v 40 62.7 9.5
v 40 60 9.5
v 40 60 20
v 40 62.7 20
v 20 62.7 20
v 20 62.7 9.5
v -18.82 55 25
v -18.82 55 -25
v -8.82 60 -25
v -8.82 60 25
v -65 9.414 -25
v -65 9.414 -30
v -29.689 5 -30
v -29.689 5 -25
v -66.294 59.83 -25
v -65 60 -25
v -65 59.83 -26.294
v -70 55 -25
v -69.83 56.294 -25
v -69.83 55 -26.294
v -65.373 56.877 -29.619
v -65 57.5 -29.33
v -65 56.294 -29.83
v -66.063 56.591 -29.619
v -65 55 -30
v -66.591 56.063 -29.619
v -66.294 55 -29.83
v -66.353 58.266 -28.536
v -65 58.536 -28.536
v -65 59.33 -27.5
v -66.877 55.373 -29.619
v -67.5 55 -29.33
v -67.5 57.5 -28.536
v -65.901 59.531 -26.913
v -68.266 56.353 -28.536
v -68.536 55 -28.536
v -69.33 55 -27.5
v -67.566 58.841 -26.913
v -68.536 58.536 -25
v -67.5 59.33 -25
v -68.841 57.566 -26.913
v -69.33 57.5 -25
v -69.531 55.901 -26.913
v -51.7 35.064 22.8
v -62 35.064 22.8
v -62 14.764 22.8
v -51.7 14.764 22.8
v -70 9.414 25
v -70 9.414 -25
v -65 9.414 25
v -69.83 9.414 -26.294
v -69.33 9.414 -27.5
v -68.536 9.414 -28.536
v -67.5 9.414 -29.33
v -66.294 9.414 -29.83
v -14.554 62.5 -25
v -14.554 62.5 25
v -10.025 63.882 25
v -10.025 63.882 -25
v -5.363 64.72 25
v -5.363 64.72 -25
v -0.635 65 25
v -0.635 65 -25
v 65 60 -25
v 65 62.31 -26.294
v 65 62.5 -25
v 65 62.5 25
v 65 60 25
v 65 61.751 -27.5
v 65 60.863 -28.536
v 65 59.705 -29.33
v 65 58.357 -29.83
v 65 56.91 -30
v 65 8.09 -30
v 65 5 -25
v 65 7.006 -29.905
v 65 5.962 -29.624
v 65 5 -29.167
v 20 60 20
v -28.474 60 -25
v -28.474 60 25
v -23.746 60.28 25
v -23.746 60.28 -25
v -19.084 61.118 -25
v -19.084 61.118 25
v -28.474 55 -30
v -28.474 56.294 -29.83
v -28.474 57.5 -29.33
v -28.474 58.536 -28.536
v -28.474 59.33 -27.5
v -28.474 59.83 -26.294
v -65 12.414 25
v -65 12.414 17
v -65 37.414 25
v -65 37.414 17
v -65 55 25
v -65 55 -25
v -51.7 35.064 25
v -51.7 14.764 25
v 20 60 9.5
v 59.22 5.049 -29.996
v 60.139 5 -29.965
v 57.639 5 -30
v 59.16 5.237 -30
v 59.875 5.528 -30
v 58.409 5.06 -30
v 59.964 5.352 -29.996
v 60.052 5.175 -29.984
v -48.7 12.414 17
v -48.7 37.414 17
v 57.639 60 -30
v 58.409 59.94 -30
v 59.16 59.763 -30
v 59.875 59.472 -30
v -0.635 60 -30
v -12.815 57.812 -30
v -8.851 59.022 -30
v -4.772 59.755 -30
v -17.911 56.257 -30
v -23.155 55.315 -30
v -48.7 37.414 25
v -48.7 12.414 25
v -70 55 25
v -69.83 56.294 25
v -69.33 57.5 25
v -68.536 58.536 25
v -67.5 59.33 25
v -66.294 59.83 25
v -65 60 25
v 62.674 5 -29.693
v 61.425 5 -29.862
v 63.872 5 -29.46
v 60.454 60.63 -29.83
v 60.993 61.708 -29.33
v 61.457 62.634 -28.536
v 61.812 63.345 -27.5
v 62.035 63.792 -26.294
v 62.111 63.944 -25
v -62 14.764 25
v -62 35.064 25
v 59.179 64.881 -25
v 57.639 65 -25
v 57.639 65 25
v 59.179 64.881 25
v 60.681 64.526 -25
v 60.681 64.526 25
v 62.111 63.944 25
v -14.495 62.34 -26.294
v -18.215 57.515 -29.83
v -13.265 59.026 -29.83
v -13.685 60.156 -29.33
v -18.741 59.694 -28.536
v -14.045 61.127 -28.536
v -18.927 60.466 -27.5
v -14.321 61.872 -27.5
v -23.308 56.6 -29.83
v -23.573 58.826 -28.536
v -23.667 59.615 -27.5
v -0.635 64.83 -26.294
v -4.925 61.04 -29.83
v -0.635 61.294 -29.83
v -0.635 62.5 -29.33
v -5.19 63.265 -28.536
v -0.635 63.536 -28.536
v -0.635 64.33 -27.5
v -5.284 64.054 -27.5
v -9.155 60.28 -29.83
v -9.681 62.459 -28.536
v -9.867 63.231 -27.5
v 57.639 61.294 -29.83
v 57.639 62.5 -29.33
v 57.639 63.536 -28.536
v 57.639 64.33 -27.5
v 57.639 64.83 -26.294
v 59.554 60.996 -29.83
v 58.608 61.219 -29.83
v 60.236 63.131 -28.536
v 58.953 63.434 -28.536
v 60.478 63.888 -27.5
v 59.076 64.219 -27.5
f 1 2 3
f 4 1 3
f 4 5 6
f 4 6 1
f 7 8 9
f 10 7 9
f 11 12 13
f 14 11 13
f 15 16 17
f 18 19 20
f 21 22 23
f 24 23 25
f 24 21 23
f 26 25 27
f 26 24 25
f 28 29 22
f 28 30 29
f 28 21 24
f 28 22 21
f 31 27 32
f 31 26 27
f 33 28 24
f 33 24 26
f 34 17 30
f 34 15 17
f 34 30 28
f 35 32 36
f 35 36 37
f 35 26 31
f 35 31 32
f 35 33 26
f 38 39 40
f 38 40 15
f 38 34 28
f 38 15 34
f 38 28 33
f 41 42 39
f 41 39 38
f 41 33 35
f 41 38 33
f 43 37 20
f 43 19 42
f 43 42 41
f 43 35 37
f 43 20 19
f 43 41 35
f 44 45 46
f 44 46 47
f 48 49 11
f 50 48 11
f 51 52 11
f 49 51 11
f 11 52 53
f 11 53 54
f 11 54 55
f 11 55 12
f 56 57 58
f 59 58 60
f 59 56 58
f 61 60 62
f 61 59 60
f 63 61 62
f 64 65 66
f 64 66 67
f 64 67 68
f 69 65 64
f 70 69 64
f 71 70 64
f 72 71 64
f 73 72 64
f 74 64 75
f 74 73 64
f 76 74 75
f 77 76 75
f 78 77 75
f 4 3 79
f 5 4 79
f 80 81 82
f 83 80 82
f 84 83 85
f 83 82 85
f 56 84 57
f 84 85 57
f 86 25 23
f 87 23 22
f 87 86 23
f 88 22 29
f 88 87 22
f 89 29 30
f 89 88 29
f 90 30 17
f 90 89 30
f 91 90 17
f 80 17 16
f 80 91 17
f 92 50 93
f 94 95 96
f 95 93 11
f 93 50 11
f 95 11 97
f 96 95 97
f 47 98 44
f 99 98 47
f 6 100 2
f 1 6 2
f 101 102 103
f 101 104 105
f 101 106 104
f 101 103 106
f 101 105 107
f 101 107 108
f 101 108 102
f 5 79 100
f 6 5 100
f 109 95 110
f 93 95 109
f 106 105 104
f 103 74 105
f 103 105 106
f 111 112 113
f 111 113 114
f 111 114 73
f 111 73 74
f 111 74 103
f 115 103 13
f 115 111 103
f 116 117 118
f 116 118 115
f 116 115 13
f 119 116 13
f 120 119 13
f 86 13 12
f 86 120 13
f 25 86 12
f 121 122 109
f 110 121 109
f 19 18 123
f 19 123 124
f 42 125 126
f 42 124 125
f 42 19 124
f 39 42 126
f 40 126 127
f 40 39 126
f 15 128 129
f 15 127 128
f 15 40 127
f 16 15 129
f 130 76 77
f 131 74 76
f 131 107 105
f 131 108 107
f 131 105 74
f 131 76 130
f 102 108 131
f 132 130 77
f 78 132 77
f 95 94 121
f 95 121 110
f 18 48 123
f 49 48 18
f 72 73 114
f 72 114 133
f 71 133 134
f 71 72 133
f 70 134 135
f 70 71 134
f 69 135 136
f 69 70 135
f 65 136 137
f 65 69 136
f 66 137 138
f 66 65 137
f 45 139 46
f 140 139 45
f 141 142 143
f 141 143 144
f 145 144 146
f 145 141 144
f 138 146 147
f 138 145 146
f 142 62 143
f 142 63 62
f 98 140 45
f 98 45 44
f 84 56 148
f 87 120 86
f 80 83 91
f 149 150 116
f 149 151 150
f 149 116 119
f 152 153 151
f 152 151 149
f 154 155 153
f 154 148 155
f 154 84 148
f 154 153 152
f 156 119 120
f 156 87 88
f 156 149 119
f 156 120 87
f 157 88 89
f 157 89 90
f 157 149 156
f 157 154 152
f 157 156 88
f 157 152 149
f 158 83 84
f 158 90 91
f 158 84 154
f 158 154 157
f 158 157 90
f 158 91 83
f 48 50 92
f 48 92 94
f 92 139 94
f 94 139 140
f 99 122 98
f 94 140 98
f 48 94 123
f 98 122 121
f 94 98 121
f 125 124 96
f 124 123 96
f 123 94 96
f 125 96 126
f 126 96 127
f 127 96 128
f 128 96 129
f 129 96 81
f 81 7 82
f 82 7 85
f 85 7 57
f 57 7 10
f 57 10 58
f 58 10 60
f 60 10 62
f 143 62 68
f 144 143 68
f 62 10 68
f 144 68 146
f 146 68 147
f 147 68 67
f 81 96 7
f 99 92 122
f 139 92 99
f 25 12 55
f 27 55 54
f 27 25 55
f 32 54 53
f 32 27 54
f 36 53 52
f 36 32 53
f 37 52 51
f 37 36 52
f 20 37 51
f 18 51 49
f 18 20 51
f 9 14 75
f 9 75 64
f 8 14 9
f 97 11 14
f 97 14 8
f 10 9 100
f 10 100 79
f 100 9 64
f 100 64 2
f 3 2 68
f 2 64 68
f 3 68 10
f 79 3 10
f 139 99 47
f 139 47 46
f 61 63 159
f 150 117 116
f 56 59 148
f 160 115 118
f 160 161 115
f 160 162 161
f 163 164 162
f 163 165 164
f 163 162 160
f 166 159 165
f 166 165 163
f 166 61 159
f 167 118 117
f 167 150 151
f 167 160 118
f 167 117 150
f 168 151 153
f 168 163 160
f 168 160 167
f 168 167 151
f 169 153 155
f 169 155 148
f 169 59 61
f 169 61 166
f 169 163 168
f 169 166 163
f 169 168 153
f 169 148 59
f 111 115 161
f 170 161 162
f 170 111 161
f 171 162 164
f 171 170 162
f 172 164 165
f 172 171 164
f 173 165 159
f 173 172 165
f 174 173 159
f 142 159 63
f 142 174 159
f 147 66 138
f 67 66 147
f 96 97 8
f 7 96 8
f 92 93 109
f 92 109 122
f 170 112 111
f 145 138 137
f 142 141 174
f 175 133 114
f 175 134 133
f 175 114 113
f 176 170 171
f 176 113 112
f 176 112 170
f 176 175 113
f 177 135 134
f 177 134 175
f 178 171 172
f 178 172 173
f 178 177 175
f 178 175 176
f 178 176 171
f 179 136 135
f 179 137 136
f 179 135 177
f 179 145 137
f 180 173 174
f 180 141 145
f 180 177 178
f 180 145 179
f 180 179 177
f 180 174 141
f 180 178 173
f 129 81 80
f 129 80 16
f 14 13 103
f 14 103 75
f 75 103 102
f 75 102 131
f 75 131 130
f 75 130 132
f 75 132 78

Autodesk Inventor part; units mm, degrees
ref_plane "YZ Plane" through (0, 0, 0) normal (1, 0, 0) x (0, 1, 0)
ref_plane "XZ Plane" through (0, 0, 0) normal (0, 1, 0) x (-1, 0, 0)
ref_plane "XY Plane" through (0, 0, 0) normal (0, 0, 1) x (1, 0, 0)
sketch "Sketch1" plane through (0, 0, 0) normal (0, 1, 0) x (-1, 0, 0)
  line L0 (-70, 30) -> (70, 30)
  line L1 (70, 30) -> (70, -30)
  line L2 (70, -30) -> (-70, -30)
  line L3 (-70, -30) -> (-70, 30)
  line L4 (-70, 30) -> (70, -30) construction
  line L5 (70, 30) -> (-70, -30) construction
  point P0 (0, 0)
  dimension "d0" = 140
  dimension "d1" = 60
extrude "Extrusion1" add sketch "Sketch1" along normal blind 60
sketch "Sketch2" plane through (0, 60, 0) normal (0, 1, 0) x (1, 0, 0)
  point P0 (0, 0)
sketch "Sketch3" plane through (0, 60, 0) normal (0, 1, 0) x (1, 0, 0)
  line L0 (70, 30) -> (-70, 30) projected
  line L1 (-70, -30) -> (70, -30) projected
  line L2 (70, 30) -> (-20, 30)
  line L3 (-20, 30) -> (-20, -30)
  line L4 (-20, -30) -> (70, -30)
  line L5 (70, -30) -> (70, 30)
  point P0 (0, 0)
  point P1 (70, -30)
  point P2 (-20, 30)
  dimension "d4" = 90
extrude "Extrusion2" add sketch "Sketch3" along normal blind 5
chamfer "Chamfer2" distance 5 distance2 40 1 edges at (-70, 0, 0) measured on face at (-70, 20, -10)
sketch "Sketch8" plane through (70, 0, 30) normal (1, 0, 0) x (0, 0, -1)
  circle A0 centre (30, 32.5) radius 13.25
  line L0 (0, 0) -> (60, 0) projected
  line L1 (60, 0) -> (60, 65) projected
  line L2 (0, 65) -> (60, 65) projected
  point P0 (30, 0)
  point P1 (60, 32.5)
  dimension "d26" = 26.5
  dimension "d27" = 32.5
  dimension "d28" = 30
  dimension "d88" = 32.5
extrude "Extrusion6" cut sketch "Sketch8" against normal blind 10
sketch "Sketch9" plane through (70, 0, -30) normal (0, 0, -1) x (-1, 0, 0)
  line L0 (5, 60) -> (5, 5)
  line L1 (5, 5) -> (99.688711, 5)
  line L2 (99.688711, 5) -> (135, 9.413911)
  line L3 (135, 9.413911) -> (135, 55)
  line L4 (135, 55) -> (88.81966, 55)
  line L5 (88.81966, 55) -> (78.81966, 60)
  line L6 (78.81966, 60) -> (5, 60)
  line L7 (0, 65) -> (90, 65)
  line L8 (50, 80) -> (90, 60)
  line L9 (90, 60) -> (140, 60)
  line L10 (140, 5) -> (140, 60)
  line L11 (140, 5) -> (100, 0)
  line L12 (0, 0) -> (100, 0)
  line L13 (0, 0) -> (0, 65)
  point P0 (70, 0)
  dimension "d35" = 5
  dimension "d36" = 5
  dimension "d37" = 5
  dimension "d38" = 5
  dimension "d39" = 5
  dimension "d40" = 5
  dimension "d41" = 5
extrude "Extrusion7" cut sketch "Sketch9" against normal blind 55 contours L6 L5 L4 L3 L2 L1 L0
ref_plane "Work Plane1" through (70, 0, 0) normal (0, 0, 1) x (1, 0, 0)
fillet "Fillet6" radius 5 1 edges at (-70, 60, 0)
fillet "Fillet9" radius 5 1 edges at (-70, 5, 0)
fillet "Fillet21" radius 40 1 edges at (-20, 65, 0)
fillet "Fillet22" radius 40 1 edges at (-20, 60, 0)
chamfer "Chamfer3" distance 10 distance2 5 1 edges at (70, 65, 0) measured on face at (46.455, 65, 10)
fillet "Fillet23" radius 5 1 edges at (70, 60, 0)
fillet "Fillet24" radius 10 1 edges at (60, 65, 0)
chamfer "Chamfer4" distance 5 distance2 10 1 edges at (70, 0, 0) measured on face at (70, 6.4489, -0.5324)
fillet "Fillet25" radius 10 1 edges at (60, 0, 0)
fillet "Fillet26" radius 5 1 edges at (70, 5, 0)
fillet "Fillet27" radius 5 15 edges at (59.9368, 64.7325, 30) (64.6738, 62.6631, 30) (69.2533, 59.5385, 30) (70, 32.5, 30) (69.2533, 5.4615, 30) (64.6738, 2.3369, 30) (59.9368, 0.2675, 30) (13.8197, 0, 30) (-7.7062, 64.37, 30) (-21.4028, 60.63, 30) (-46.737, 60, 30) (-70, 32.207, 30) (-68.7484, 6.1049, 30) (-47.8101, 2.2263, 30) (28.5021, 65, 30)
ref_plane "Work Plane7" through (65, 55, -24.5) normal (0, 0, -1) x (-1, 0, 0)
sketch "Sketch24" plane through (65, 55, -24.5) normal (0, 0, -1) x (-1, 0, 0)
  line L0 (0, 0) -> (5, 0) projected
  line L1 (5, 5) -> (5, 0) projected
  line L2 (5, 0) -> (5, 5) projected
  line L3 (0, 0) -> (0, 5) projected
  line L4 (5, 5) -> (0, 0)
  line L5 (5, -45) -> (5, -50) projected
  line L6 (0, -45) -> (5, -45) projected
  line L7 (0, -50) -> (0, -45) projected
  line L8 (0, -45) -> (5, -50)
  point P0 (65, -55)
extrude "Extrusion21" cut sketch "Sketch24" against normal blind 5
sketch "Sketch27" plane through (65, 5, -30) normal (-1, 0, 0) x (0, 0, 1)
  line L0 (8.5, 30) -> (13.5, 30)
  line L1 (13.5, 30) -> (13.5, 25)
  line L2 (13.5, 25) -> (8.5, 25)
  line L3 (8.5, 25) -> (8.5, 30)
  line L4 (8.5, 30) -> (13.5, 25) construction
  line L5 (13.5, 30) -> (8.5, 25) construction
  circle A0 centre (30, 27.5) radius 13.25 projected
  line L6 (30, 73) -> (30, -18) projected
  line L7 (51.5, 30) -> (46.5, 30)
  line L8 (46.5, 30) -> (46.5, 25)
  line L9 (46.5, 25) -> (51.5, 25)
  line L10 (51.5, 25) -> (51.5, 30)
  point P0 (30, -5)
  point P1 (11, 27.5)
  dimension "d137" = 0
  dimension "d138" = 19
  dimension "d139" = 5
  dimension "d140" = 5
extrude "Extrusion24" add sketch "Sketch27" along normal blind 10 contours L0 L1 L2 L3 | L10 L9 L8 L7
sketch "Sketch28" plane through (65, 30, 16.5) normal (0, 0, -1) x (-1, 0, 0)
  line L0 (0, 5) -> (10, 5) projected
  line L1 (0, 0) -> (10, 0) projected
  line L2 (10, 5) -> (5, 5)
  line L3 (5, 5) -> (5, 0)
  line L4 (5, 0) -> (10, 0)
  line L5 (10, 0) -> (10, 5)
  point P0 (65, -30)
  point P1 (5, 5)
  dimension "d143" = 5
extrude "Extrusion25" add sketch "Sketch28" along normal up to surface (33 mm away)
sketch "Sketch29" plane through (55, 5, -30) normal (-1, 0, 0) x (0, 0, 1)
  line L0 (30, 73) -> (30, -18) projected
  circle A0 centre (25.5, 27.5) radius 1.5
  line L1 (51.5, 30) -> (8.5, 30) projected
  line L2 (8.5, 25) -> (51.5, 25) projected
  circle A1 centre (34.5, 27.5) radius 1.5
  point P0 (30, -5)
  dimension "d146" = 4.5
  dimension "d147" = 3
  dimension "d148" = 2.5
  dimension "d149" = 2.5
extrude "Extrusion26" cut sketch "Sketch29" against normal up to surface (5 mm away)
sketch "Sketch30" plane through (55, 5, -30) normal (-1, 0, 0) x (0, 0, 1)
  line L0 (30, 73) -> (30, -18) projected
  circle A0 centre (30, 27.5) radius 3.5
  line L1 (51.5, 30) -> (8.5, 30) projected
  point P0 (30, -5)
  dimension "d152" = 2.5
  dimension "d153" = 7
extrude "Extrusion27" cut sketch "Sketch30" against normal up to surface (5 mm away)
sketch "Sketch32" plane through (0, 0, 0) normal (0, -1, 0) x (1, 0, 0)
  circle A0 centre (20, 0) radius 14.25
  line L0 (65, -30) -> (65, 25) projected
  point P0 (0, 0)
  point P1 (65, -21.5)
  dimension "d158" = 28.5
  dimension "d159" = 45
extrude "Extrusion29" cut sketch "Sketch32" against normal blind 5
ref_plane "Work Plane4" through (0, 32.5, 0) normal (0, -1, 0) x (1, 0, 0)
sketch "Sketch34" plane through (-29.688711, 5, -30) normal (0, 1, 0) x (1, 0, 0)
  line L0 (15.188711, -15.5) -> (8.188711, -15.5)
  line L1 (8.188711, -15.5) -> (8.188711, -8.5)
  line L2 (8.188711, -8.5) -> (15.188711, -8.5)
  line L3 (15.188711, -8.5) -> (15.188711, -15.5)
  line L4 (15.188711, -15.5) -> (8.188711, -8.5) construction
  line L5 (8.188711, -15.5) -> (15.188711, -8.5) construction
  line L6 (127.688711, -30) -> (-68.311289, -30)
  circle A0 centre (49.688711, -30) radius 14.25
  line L7 (15.188711, -44.5) -> (8.188711, -44.5)
  line L8 (8.188711, -44.5) -> (8.188711, -51.5)
  line L9 (8.188711, -51.5) -> (15.188711, -51.5)
  line L10 (15.188711, -51.5) -> (15.188711, -44.5)
  point P0 (29.688711, -30)
  point P1 (11.688711, -12)
  dimension "d163" = 7
  dimension "d164" = 7
  dimension "d166" = 18
  dimension "d167" = 38
extrude "Extrusion30" add sketch "Sketch34" along normal blind 12 contours L0 L1 L2 L3 | L10 L9 L8 L7
sketch "Sketch35" plane through (-29.688711, 17, -30) normal (0, 1, 0) x (1, 0, 0)
  circle A0 centre (11.688711, -48) radius 2
  line L0 (8.188711, -44.5) -> (8.188711, -51.5)
  line L1 (15.188711, -44.5) -> (8.188711, -44.5)
  line L2 (15.188711, -51.5) -> (15.188711, -44.5)
  line L3 (127.688711, -30) -> (-68.311289, -30)
  circle A1 centre (11.688711, -12) radius 2
  point P0 (29.688711, -30)
  dimension "d170" = 4
  dimension "d171" = 3.5
  dimension "d172" = 3.5
  dimension "d173" = 3.5
extrude "Extrusion31" cut sketch "Sketch35" against normal blind 5
sketch "Sketch37" plane through (-29.688711, 5, -30) normal (0, 1, 0) x (1, 0, 0)
  line L0 (8.188711, -51.5) -> (8.188711, -44.5)
  line L1 (0, -55) -> (94.688711, -55)
  line L2 (8.188711, -51.5) -> (15.188711, -51.5)
  line L3 (15.188711, -51.5) -> (15.188711, -55)
  line L4 (15.188711, -55) -> (8.188711, -55)
  line L5 (8.188711, -55) -> (8.188711, -51.5)
  line L6 (15.188711, -44.5) -> (15.188711, -51.5)
  point P0 (29.688711, -30)
  point P1 (8.188711, -55)
  dimension "d178" = 0
extrude "Extrusion32" add sketch "Sketch37" along normal blind 12
sketch "Sketch38" plane through (65, 30, 21.5) normal (0, 0, 1) x (1, 0, 0)
  line L0 (0, 5) -> (0, 0) projected
  line L1 (0, 5) -> (-10, 5) projected
  line L2 (-10, 0) -> (-10, 5) projected
  line L3 (0, 0) -> (-10, 0) projected
  point P0 (-65, -30)
extrude "Extrusion33" add sketch "Sketch38" along normal up to surface (3.5 mm away)
ref_plane "Work Plane6" through (-70, 9.413911, -22.5) normal (0, 0, -1) x (-1, 0, 0)
ref_plane "Work Plane5" through (-70, 9.413911, -15) normal (0, 0, -1) x (-1, 0, 0)
sketch "Sketch42" plane through (55, 5, -30) normal (-1, 0, 0) x (0, 0, 1)
  line L0 (22.5, 34) -> (37.5, 34)
  line L1 (37.5, 34) -> (37.5, 21)
  line L2 (37.5, 21) -> (22.5, 21)
  line L3 (22.5, 21) -> (22.5, 34)
  arc A0 (32.44949, 25) -> (33.361111, 26.523818) centre (30, 27.5) ccw
  line L4 (22.5, 34) -> (37.5, 21) construction
  line L5 (37.5, 34) -> (22.5, 21) construction
  point P0 (30, -5)
  dimension "d193" = 15
  dimension "d194" = 13
extrude "Extrusion36" add sketch "Sketch42" against normal blind 5
sketch "Sketch43" plane through (55, 5, -30) normal (-1, 0, 0) x (0, 0, 1)
  line L0 (24, 32.5) -> (36, 32.5)
  line L1 (36, 32.5) -> (36, 22.5)
  line L2 (36, 22.5) -> (24, 22.5)
  line L3 (24, 22.5) -> (24, 32.5)
  circle A0 centre (30, 27.5) radius 2.15 projected
  line L4 (24, 32.5) -> (36, 22.5) construction
  line L5 (36, 32.5) -> (24, 22.5) construction
  point P0 (30, -5)
  dimension "d197" = 12
  dimension "d199" = 10
extrude "Extrusion37" cut sketch "Sketch43" against normal blind 2.5
sketch "Sketch44" plane through (55, 5, -30) normal (-1, 0, 0) x (0, 0, 1)
  line L0 (22.5, 25) -> (22.5, 21) projected
  line L1 (8.5, 25) -> (22.5, 25) projected
  line L2 (22.5, 21) -> (18.5, 25)
  point P0 (30, -5)
  dimension "d202" = 45
  dimension "d203" = 45
extrude "Extrusion38" add sketch "Sketch44" against normal blind 5
mirror "Mirror1" about plane through (70, 0, 0) normal (0, 0, 1) of "Extrusion38"
sketch "Sketch45" plane through (55, 5, -30) normal (-1, 0, 0) x (0, 0, 1)
  line L0 (37.5, 34) -> (22.5, 34) projected
  line L1 (22.5, 34) -> (18.5, 30)
  line L2 (8.5, 30) -> (22.5, 30) projected
  line L3 (22.5, 34) -> (22.5, 30) projected
  point P0 (30, -5)
  dimension "d206" = 45
  dimension "d207" = 45
extrude "Extrusion39" add sketch "Sketch45" against normal blind 5
mirror "Mirror2" about plane through (70, 0, 0) normal (0, 0, 1) of "Extrusion39"
sketch "Sketch46" plane through (55, 32.5, 0) normal (-1, 0, 0) x (0, 0, 1)
  circle A0 centre (0, 0) radius 4
  point P0 (0, -32.5)
  dimension "d210" = 8
extrude "Extrusion40" cut sketch "Sketch46" against normal blind 5
sketch "Sketch47" plane through (70, 0, 25) normal (0, 0, -1) x (-1, 0, 0)
  line L0 (5, 35) -> (15, 35)
  line L1 (15, 35) -> (15, 30)
  line L2 (15, 30) -> (5, 30)
  line L3 (5, 5) -> (5, 30)
  line L4 (84.5, 5) -> (5, 5)
  line L5 (84.5, 5) -> (84.5, 17)
  line L6 (84.5, 17) -> (91.5, 17)
  line L7 (91.5, 17) -> (91.5, 5)
  line L8 (99.688711, 5) -> (91.5, 5)
  line L9 (135, 9.413911) -> (99.688711, 5)
  line L10 (135, 55) -> (135, 9.413911)
  line L11 (88.81966, 55) -> (135, 55)
  line L12 (78.81966, 60) -> (88.81966, 55)
  line L13 (5, 60) -> (78.81966, 60)
  line L14 (5, 35) -> (5, 60)
  line L15 (91.5, 5) -> (84.5, 5)
  point P0 (70, 0)
extrude "Extrusion41" cut sketch "Sketch47" against normal blind 10
sketch "Sketch48" plane through (-70, 9.413911, -30) normal (0, 0, -1) x (-1, 0, 0)
  line L0 (-135, 50.586089) -> (-61.18034, 50.586089)
  line L1 (-61.18034, 50.586089) -> (-51.18034, 45.586089)
  line L2 (-51.18034, 45.586089) -> (-5, 45.586089)
  line L3 (-5, 45.586089) -> (-5, 0)
  line L4 (-5, 0) -> (-40.311289, -4.413911)
  line L5 (-40.311289, -4.413911) -> (-135, -4.413911)
  line L6 (-135, -4.413911) -> (-135, 50.586089)
  point P0 (-70, -9.413911)
extrude "Extrusion42" add sketch "Sketch48" against normal blind 5
fillet "Fillet29" radius 5 16 edges at (-7.7062, 64.37, -30) (-21.4028, 60.63, -30) (-46.737, 60, -30) (-68.5355, 58.5355, -30) (-70, 32.207, -30) (-68.7484, 6.1049, -30) (-47.8101, 2.2263, -30) (59.9368, 64.7325, -30) (64.6738, 62.6631, -30) (69.2533, 59.5385, -30) (70, 32.5, -30) (69.2533, 5.4615, -30) (64.6738, 2.3369, -30) (59.9368, 0.2675, -30) (13.8197, 0, -30) (28.5021, 65, -30)
sketch "Sketch50" plane through (70, 8.09017, 25) normal (1, 0, 0) x (0, 0, -1)
  line L0 (50, -3.09017) -> (-4.166615, -3.09017)
  line L1 (-5, 21.90983) -> (-5, 0)
  line L2 (-5, 48.81966) -> (-5, 26.90983)
  line L3 (-5, 26.90983) -> (-5, 21.90983)
  ellipse E0 centre (0, 0) end of major axis (0, -5.59017) minor radius 5 (-5, 0) -> (-4.166615, -3.09017) ccw
  line L4 (50, 51.90983) -> (-4.166615, 51.90983)
  line L5 (55, 0) -> (55, 48.81966)
  ellipse E1 centre (50, 0) end of major axis (55, 0) minor radius 4.472136 (50, -4.472136) -> (55, 0) ccw
  line L6 (46.5, 51.90983) -> (55, 51.90983)
  line L7 (55, 51.90983) -> (55, 48.23178)
  line L8 (-4.166615, 51.90983) -> (-5, 51.90983)
  ellipse E2 centre (0, 48.81966) end of major axis (-5, 48.81966) minor radius 4.472136 (0, 53.291796) -> (-5, 48.81966) ccw
  line L9 (-5, 51.90983) -> (-5, 48.81966)
  line L10 (46.5, -3.09017) -> (53.614355, -3.09017)
  line L11 (50, 48.81966) -> (50, 0)
  line L12 (50, -4.472136) -> (50, 0)
  line L13 (50, 48.81966) -> (50, 53.291796)
  point P0 (25, -8.09017)
  point P1 (-3.614355, 51.90983)
sketch "Sketch51" plane through (-0.635083, 60, 30) normal (0, -1, 0) x (1, 0, 0)
  line L0 (65.635083, -55) -> (65.635083, -0.833385)
  line L1 (70.635083, -5) -> (70.635083, -55)
  line L2 (70.635083, -51.5) -> (70.635083, -0.833385)
  line L3 (65.635083, -0.833385) -> (70.635083, -0.833385)
  line L4 (58.274403, 0) -> (-29.053628, 0)
  line L5 (-8.184577, -55) -> (65.635083, -55)
  line L6 (70.635083, -60) -> (65.635083, -55)
  line L7 (70.635083, -60) -> (65.635083, -55)
  line L8 (67.871151, -55) -> (70.635083, -55)
  line L9 (65.635083, -55) -> (70.635083, -55)
  point P0 (0.635083, -30)
  point P1 (65.635083, -51.5)
  point P2 (65.635083, -55)
  point P3 (67.871151, -55)
extrude "Extrusion43" cut sketch "Sketch50" against normal blind 50 contours L0 E0 L1 L3 L2 E2 L4 L13 L11 L12
extrude "Extrusion44" cut sketch "Sketch51" against normal blind 50
sketch "Sketch52" plane through (-0.635083, 60, 30) normal (0, 1, 0) x (1, 0, 0)
  line L0 (67.180168, 1.385645) -> (65.635083, 1.385645)
  line L1 (65.635083, 1.385645) -> (68.166593, 1.385645)
  line L2 (68.166593, 1.385645) -> (68.166593, -1.6054)
  line L3 (68.166593, -1.6054) -> (65.635083, -1.6054)
  line L4 (65.635083, -1.6054) -> (65.635083, 1.385645)
  point P0 (0.635083, 30)
  point P1 (67.180168, 1.385645)
extrude "Extrusion45" cut sketch "Sketch52" against normal blind 10
sketch "Sketch53" plane through (-70, 9.413911, 25) normal (-1, 0, 0) x (0, 0, 1)
  line L0 (-50, 0) -> (-50, 45.586089)
  line L1 (-50, 0) -> (13.21215, 0)
  line L2 (13.21215, 0) -> (13.21215, -27.239503)
  line L3 (13.21215, -27.239503) -> (-50, -27.239503)
  line L4 (-50, -27.239503) -> (-50, 0)
  point P0 (-25, -9.413911)
extrude "Extrusion46" cut sketch "Sketch53" against normal blind 200
sketch "Sketch54" plane through (-14.5, 17, 25) normal (1, 0, 0) x (0, 0, -1)
  line L0 (0, 0) -> (10.5, 0)
  line L1 (0, 0) -> (47.590826, 0)
  line L2 (47.590826, 0) -> (47.590826, -20.025121)
  line L3 (47.590826, -20.025121) -> (0, -20.025121)
  line L4 (0, -20.025121) -> (0, 0)
  point P0 (25, -17)
  point P1 (10.5, 0)
extrude "Extrusion47" cut sketch "Sketch54" against normal blind 10
sketch "Sketch55" plane through (57.63932, 5, -30) normal (0, 0, -1) x (-1, 0, 0)
  line L0 (122.63932, 4.413911) -> (87.328031, 0)
  line L1 (127.63932, 4.413911) -> (122.63932, 4.413911)
  line L2 (87.328031, 0) -> (0, 0)
  line L3 (-7.36068, 55) -> (-7.36068, 57.5)
  line L4 (-7.36068, 3.09017) -> (-7.36068, 51.90983)
  line L5 (-7.36068, 51.90983) -> (-7.36068, 55)
  line L6 (-9.596748, -1.381966) -> (-7.36068, 3.09017)
  line L7 (-7.36068, 3.09017) -> (-7.36068, 0)
  arc A0 (-2.236068, 0.527864) -> (0, 0) centre (0, 5) ccw
  line L8 (-7.36068, 0) -> (0, 0)
  arc A1 (-9.596748, 56.381966) -> (-12.36068, 51.90983) centre (-7.36068, 51.90983) ccw
  line L9 (-12.36068, 51.90983) -> (-12.36068, 3.09017)
  arc A2 (-12.36068, 3.09017) -> (-9.596748, -1.381966) centre (-7.36068, 3.09017) ccw
  line L10 (-9.596748, -1.381966) -> (-4.472136, -3.944272)
  arc A3 (-4.472136, -3.944272) -> (0, -5) centre (0, 5) ccw
  line L11 (0, -5) -> (87.63932, -5)
  line L12 (87.63932, -5) -> (123.259494, -0.547478)
  arc A4 (123.259494, -0.547478) -> (127.63932, 4.413911) centre (122.63932, 4.413911) ccw
  line L13 (-7.36068, 57.5) -> (-9.596748, 56.381966)
  point P0 (57.63932, -5)
extrude "Extrusion48" cut sketch "Sketch55" against normal blind 10
sketch "Sketch56" plane through (65, 60, 29.166615) normal (1, 0, 0) x (0, 0, -1)
  arc A0 (4.166615, 5) -> (-0.833385, 0) centre (4.166615, 0) ccw
  line L0 (4.166615, 5) -> (-2.994967, 5)
  line L1 (-2.994967, 5) -> (-2.994967, -58.255247)
  line L2 (-2.994967, -58.255247) -> (4.166615, -58.255247)
  line L3 (4.166615, -58.255247) -> (4.166615, 5)
  point P0 (29.166615, -60)
extrude "Extrusion49" cut sketch "Sketch56" against normal through all
sketch "Sketch57" plane through (-8.81966, 60, -25) normal (0, -1, 0) x (1, 0, 0)
  line L0 (28.81966, 34.5) -> (48.81966, 34.5)
  line L1 (48.81966, 34.5) -> (48.81966, 45)
  line L2 (48.81966, 45) -> (28.81966, 45)
  line L3 (28.81966, 45) -> (28.81966, 34.5)
  line L4 (73.81966, 0) -> (73.81966, 50)
  line L5 (73.81966, 50) -> (0, 50)
  point P0 (8.81966, 25)
  point P1 (48.81966, 39.75)
  point P2 (36.90983, 50)
  dimension "d232" = 25
  dimension "d233" = 15.5
  dimension "d234" = 5
  dimension "d235" = 20
extrude "Extrusion50" cut sketch "Sketch57" against normal blind 2.7
sketch "Sketch58" plane through (-65, 9.413911, -25) normal (1, 0, 0) x (0, 0, -1)
  line L0 (-50, 28) -> (-42, 28)
  line L1 (-42, 28) -> (-42, 3)
  line L2 (-42, 3) -> (-50, 3)
  line L3 (-50, 3) -> (-50, 28)
  line L4 (0, 0) -> (-50, 0)
  line L5 (-50, 45.586089) -> (-50, 0)
  point P0 (-25, -9.413911)
  dimension "d238" = 8
  dimension "d239" = 3
  dimension "d240" = 0
  dimension "d241" = 25
extrude "Extrusion51" add sketch "Sketch58" along normal blind 22
sketch "Sketch59" plane through (-8.81966, 60, 25) normal (0, 0, 1) x (1, 0, 0)
  line L0 (-53.18034, -24.936089) -> (-42.88034, -24.936089)
  line L1 (-42.88034, -24.936089) -> (-42.88034, -45.236089)
  line L2 (-42.88034, -45.236089) -> (-53.18034, -45.236089)
  line L3 (-53.18034, -45.236089) -> (-53.18034, -24.936089)
  line L4 (-56.18034, -5) -> (-56.18034, -22.586089)
  line L5 (-61.18034, -5) -> (-61.18034, -50.586089)
  line L6 (-56.18034, -47.586089) -> (-34.18034, -47.586089)
  line L7 (-56.18034, -22.586089) -> (-34.18034, -22.586089)
  point P0 (8.81966, -60)
  dimension "d245" = 8
  dimension "d246" = 10.3
  dimension "d247" = 20.3
  dimension "d248" = 2.35
  dimension "d249" = 2.35
extrude "Extrusion52" cut sketch "Sketch59" against normal blind 2.2
sketch "Sketch60" plane through (-43, 9.413911, -25) normal (1, 0, 0) x (0, 0, -1)
  line L0 (-42, 28) -> (-50, 28) projected
  line L1 (-50, 28) -> (-50, 3) projected
  line L2 (-50, 3) -> (-42, 3) projected
  line L3 (-42, 3) -> (-42, 28) projected
  point P0 (-25, -9.413911)
extrude "Extrusion53" cut sketch "Sketch60" against normal blind 5.7
properties part number "gondola"
